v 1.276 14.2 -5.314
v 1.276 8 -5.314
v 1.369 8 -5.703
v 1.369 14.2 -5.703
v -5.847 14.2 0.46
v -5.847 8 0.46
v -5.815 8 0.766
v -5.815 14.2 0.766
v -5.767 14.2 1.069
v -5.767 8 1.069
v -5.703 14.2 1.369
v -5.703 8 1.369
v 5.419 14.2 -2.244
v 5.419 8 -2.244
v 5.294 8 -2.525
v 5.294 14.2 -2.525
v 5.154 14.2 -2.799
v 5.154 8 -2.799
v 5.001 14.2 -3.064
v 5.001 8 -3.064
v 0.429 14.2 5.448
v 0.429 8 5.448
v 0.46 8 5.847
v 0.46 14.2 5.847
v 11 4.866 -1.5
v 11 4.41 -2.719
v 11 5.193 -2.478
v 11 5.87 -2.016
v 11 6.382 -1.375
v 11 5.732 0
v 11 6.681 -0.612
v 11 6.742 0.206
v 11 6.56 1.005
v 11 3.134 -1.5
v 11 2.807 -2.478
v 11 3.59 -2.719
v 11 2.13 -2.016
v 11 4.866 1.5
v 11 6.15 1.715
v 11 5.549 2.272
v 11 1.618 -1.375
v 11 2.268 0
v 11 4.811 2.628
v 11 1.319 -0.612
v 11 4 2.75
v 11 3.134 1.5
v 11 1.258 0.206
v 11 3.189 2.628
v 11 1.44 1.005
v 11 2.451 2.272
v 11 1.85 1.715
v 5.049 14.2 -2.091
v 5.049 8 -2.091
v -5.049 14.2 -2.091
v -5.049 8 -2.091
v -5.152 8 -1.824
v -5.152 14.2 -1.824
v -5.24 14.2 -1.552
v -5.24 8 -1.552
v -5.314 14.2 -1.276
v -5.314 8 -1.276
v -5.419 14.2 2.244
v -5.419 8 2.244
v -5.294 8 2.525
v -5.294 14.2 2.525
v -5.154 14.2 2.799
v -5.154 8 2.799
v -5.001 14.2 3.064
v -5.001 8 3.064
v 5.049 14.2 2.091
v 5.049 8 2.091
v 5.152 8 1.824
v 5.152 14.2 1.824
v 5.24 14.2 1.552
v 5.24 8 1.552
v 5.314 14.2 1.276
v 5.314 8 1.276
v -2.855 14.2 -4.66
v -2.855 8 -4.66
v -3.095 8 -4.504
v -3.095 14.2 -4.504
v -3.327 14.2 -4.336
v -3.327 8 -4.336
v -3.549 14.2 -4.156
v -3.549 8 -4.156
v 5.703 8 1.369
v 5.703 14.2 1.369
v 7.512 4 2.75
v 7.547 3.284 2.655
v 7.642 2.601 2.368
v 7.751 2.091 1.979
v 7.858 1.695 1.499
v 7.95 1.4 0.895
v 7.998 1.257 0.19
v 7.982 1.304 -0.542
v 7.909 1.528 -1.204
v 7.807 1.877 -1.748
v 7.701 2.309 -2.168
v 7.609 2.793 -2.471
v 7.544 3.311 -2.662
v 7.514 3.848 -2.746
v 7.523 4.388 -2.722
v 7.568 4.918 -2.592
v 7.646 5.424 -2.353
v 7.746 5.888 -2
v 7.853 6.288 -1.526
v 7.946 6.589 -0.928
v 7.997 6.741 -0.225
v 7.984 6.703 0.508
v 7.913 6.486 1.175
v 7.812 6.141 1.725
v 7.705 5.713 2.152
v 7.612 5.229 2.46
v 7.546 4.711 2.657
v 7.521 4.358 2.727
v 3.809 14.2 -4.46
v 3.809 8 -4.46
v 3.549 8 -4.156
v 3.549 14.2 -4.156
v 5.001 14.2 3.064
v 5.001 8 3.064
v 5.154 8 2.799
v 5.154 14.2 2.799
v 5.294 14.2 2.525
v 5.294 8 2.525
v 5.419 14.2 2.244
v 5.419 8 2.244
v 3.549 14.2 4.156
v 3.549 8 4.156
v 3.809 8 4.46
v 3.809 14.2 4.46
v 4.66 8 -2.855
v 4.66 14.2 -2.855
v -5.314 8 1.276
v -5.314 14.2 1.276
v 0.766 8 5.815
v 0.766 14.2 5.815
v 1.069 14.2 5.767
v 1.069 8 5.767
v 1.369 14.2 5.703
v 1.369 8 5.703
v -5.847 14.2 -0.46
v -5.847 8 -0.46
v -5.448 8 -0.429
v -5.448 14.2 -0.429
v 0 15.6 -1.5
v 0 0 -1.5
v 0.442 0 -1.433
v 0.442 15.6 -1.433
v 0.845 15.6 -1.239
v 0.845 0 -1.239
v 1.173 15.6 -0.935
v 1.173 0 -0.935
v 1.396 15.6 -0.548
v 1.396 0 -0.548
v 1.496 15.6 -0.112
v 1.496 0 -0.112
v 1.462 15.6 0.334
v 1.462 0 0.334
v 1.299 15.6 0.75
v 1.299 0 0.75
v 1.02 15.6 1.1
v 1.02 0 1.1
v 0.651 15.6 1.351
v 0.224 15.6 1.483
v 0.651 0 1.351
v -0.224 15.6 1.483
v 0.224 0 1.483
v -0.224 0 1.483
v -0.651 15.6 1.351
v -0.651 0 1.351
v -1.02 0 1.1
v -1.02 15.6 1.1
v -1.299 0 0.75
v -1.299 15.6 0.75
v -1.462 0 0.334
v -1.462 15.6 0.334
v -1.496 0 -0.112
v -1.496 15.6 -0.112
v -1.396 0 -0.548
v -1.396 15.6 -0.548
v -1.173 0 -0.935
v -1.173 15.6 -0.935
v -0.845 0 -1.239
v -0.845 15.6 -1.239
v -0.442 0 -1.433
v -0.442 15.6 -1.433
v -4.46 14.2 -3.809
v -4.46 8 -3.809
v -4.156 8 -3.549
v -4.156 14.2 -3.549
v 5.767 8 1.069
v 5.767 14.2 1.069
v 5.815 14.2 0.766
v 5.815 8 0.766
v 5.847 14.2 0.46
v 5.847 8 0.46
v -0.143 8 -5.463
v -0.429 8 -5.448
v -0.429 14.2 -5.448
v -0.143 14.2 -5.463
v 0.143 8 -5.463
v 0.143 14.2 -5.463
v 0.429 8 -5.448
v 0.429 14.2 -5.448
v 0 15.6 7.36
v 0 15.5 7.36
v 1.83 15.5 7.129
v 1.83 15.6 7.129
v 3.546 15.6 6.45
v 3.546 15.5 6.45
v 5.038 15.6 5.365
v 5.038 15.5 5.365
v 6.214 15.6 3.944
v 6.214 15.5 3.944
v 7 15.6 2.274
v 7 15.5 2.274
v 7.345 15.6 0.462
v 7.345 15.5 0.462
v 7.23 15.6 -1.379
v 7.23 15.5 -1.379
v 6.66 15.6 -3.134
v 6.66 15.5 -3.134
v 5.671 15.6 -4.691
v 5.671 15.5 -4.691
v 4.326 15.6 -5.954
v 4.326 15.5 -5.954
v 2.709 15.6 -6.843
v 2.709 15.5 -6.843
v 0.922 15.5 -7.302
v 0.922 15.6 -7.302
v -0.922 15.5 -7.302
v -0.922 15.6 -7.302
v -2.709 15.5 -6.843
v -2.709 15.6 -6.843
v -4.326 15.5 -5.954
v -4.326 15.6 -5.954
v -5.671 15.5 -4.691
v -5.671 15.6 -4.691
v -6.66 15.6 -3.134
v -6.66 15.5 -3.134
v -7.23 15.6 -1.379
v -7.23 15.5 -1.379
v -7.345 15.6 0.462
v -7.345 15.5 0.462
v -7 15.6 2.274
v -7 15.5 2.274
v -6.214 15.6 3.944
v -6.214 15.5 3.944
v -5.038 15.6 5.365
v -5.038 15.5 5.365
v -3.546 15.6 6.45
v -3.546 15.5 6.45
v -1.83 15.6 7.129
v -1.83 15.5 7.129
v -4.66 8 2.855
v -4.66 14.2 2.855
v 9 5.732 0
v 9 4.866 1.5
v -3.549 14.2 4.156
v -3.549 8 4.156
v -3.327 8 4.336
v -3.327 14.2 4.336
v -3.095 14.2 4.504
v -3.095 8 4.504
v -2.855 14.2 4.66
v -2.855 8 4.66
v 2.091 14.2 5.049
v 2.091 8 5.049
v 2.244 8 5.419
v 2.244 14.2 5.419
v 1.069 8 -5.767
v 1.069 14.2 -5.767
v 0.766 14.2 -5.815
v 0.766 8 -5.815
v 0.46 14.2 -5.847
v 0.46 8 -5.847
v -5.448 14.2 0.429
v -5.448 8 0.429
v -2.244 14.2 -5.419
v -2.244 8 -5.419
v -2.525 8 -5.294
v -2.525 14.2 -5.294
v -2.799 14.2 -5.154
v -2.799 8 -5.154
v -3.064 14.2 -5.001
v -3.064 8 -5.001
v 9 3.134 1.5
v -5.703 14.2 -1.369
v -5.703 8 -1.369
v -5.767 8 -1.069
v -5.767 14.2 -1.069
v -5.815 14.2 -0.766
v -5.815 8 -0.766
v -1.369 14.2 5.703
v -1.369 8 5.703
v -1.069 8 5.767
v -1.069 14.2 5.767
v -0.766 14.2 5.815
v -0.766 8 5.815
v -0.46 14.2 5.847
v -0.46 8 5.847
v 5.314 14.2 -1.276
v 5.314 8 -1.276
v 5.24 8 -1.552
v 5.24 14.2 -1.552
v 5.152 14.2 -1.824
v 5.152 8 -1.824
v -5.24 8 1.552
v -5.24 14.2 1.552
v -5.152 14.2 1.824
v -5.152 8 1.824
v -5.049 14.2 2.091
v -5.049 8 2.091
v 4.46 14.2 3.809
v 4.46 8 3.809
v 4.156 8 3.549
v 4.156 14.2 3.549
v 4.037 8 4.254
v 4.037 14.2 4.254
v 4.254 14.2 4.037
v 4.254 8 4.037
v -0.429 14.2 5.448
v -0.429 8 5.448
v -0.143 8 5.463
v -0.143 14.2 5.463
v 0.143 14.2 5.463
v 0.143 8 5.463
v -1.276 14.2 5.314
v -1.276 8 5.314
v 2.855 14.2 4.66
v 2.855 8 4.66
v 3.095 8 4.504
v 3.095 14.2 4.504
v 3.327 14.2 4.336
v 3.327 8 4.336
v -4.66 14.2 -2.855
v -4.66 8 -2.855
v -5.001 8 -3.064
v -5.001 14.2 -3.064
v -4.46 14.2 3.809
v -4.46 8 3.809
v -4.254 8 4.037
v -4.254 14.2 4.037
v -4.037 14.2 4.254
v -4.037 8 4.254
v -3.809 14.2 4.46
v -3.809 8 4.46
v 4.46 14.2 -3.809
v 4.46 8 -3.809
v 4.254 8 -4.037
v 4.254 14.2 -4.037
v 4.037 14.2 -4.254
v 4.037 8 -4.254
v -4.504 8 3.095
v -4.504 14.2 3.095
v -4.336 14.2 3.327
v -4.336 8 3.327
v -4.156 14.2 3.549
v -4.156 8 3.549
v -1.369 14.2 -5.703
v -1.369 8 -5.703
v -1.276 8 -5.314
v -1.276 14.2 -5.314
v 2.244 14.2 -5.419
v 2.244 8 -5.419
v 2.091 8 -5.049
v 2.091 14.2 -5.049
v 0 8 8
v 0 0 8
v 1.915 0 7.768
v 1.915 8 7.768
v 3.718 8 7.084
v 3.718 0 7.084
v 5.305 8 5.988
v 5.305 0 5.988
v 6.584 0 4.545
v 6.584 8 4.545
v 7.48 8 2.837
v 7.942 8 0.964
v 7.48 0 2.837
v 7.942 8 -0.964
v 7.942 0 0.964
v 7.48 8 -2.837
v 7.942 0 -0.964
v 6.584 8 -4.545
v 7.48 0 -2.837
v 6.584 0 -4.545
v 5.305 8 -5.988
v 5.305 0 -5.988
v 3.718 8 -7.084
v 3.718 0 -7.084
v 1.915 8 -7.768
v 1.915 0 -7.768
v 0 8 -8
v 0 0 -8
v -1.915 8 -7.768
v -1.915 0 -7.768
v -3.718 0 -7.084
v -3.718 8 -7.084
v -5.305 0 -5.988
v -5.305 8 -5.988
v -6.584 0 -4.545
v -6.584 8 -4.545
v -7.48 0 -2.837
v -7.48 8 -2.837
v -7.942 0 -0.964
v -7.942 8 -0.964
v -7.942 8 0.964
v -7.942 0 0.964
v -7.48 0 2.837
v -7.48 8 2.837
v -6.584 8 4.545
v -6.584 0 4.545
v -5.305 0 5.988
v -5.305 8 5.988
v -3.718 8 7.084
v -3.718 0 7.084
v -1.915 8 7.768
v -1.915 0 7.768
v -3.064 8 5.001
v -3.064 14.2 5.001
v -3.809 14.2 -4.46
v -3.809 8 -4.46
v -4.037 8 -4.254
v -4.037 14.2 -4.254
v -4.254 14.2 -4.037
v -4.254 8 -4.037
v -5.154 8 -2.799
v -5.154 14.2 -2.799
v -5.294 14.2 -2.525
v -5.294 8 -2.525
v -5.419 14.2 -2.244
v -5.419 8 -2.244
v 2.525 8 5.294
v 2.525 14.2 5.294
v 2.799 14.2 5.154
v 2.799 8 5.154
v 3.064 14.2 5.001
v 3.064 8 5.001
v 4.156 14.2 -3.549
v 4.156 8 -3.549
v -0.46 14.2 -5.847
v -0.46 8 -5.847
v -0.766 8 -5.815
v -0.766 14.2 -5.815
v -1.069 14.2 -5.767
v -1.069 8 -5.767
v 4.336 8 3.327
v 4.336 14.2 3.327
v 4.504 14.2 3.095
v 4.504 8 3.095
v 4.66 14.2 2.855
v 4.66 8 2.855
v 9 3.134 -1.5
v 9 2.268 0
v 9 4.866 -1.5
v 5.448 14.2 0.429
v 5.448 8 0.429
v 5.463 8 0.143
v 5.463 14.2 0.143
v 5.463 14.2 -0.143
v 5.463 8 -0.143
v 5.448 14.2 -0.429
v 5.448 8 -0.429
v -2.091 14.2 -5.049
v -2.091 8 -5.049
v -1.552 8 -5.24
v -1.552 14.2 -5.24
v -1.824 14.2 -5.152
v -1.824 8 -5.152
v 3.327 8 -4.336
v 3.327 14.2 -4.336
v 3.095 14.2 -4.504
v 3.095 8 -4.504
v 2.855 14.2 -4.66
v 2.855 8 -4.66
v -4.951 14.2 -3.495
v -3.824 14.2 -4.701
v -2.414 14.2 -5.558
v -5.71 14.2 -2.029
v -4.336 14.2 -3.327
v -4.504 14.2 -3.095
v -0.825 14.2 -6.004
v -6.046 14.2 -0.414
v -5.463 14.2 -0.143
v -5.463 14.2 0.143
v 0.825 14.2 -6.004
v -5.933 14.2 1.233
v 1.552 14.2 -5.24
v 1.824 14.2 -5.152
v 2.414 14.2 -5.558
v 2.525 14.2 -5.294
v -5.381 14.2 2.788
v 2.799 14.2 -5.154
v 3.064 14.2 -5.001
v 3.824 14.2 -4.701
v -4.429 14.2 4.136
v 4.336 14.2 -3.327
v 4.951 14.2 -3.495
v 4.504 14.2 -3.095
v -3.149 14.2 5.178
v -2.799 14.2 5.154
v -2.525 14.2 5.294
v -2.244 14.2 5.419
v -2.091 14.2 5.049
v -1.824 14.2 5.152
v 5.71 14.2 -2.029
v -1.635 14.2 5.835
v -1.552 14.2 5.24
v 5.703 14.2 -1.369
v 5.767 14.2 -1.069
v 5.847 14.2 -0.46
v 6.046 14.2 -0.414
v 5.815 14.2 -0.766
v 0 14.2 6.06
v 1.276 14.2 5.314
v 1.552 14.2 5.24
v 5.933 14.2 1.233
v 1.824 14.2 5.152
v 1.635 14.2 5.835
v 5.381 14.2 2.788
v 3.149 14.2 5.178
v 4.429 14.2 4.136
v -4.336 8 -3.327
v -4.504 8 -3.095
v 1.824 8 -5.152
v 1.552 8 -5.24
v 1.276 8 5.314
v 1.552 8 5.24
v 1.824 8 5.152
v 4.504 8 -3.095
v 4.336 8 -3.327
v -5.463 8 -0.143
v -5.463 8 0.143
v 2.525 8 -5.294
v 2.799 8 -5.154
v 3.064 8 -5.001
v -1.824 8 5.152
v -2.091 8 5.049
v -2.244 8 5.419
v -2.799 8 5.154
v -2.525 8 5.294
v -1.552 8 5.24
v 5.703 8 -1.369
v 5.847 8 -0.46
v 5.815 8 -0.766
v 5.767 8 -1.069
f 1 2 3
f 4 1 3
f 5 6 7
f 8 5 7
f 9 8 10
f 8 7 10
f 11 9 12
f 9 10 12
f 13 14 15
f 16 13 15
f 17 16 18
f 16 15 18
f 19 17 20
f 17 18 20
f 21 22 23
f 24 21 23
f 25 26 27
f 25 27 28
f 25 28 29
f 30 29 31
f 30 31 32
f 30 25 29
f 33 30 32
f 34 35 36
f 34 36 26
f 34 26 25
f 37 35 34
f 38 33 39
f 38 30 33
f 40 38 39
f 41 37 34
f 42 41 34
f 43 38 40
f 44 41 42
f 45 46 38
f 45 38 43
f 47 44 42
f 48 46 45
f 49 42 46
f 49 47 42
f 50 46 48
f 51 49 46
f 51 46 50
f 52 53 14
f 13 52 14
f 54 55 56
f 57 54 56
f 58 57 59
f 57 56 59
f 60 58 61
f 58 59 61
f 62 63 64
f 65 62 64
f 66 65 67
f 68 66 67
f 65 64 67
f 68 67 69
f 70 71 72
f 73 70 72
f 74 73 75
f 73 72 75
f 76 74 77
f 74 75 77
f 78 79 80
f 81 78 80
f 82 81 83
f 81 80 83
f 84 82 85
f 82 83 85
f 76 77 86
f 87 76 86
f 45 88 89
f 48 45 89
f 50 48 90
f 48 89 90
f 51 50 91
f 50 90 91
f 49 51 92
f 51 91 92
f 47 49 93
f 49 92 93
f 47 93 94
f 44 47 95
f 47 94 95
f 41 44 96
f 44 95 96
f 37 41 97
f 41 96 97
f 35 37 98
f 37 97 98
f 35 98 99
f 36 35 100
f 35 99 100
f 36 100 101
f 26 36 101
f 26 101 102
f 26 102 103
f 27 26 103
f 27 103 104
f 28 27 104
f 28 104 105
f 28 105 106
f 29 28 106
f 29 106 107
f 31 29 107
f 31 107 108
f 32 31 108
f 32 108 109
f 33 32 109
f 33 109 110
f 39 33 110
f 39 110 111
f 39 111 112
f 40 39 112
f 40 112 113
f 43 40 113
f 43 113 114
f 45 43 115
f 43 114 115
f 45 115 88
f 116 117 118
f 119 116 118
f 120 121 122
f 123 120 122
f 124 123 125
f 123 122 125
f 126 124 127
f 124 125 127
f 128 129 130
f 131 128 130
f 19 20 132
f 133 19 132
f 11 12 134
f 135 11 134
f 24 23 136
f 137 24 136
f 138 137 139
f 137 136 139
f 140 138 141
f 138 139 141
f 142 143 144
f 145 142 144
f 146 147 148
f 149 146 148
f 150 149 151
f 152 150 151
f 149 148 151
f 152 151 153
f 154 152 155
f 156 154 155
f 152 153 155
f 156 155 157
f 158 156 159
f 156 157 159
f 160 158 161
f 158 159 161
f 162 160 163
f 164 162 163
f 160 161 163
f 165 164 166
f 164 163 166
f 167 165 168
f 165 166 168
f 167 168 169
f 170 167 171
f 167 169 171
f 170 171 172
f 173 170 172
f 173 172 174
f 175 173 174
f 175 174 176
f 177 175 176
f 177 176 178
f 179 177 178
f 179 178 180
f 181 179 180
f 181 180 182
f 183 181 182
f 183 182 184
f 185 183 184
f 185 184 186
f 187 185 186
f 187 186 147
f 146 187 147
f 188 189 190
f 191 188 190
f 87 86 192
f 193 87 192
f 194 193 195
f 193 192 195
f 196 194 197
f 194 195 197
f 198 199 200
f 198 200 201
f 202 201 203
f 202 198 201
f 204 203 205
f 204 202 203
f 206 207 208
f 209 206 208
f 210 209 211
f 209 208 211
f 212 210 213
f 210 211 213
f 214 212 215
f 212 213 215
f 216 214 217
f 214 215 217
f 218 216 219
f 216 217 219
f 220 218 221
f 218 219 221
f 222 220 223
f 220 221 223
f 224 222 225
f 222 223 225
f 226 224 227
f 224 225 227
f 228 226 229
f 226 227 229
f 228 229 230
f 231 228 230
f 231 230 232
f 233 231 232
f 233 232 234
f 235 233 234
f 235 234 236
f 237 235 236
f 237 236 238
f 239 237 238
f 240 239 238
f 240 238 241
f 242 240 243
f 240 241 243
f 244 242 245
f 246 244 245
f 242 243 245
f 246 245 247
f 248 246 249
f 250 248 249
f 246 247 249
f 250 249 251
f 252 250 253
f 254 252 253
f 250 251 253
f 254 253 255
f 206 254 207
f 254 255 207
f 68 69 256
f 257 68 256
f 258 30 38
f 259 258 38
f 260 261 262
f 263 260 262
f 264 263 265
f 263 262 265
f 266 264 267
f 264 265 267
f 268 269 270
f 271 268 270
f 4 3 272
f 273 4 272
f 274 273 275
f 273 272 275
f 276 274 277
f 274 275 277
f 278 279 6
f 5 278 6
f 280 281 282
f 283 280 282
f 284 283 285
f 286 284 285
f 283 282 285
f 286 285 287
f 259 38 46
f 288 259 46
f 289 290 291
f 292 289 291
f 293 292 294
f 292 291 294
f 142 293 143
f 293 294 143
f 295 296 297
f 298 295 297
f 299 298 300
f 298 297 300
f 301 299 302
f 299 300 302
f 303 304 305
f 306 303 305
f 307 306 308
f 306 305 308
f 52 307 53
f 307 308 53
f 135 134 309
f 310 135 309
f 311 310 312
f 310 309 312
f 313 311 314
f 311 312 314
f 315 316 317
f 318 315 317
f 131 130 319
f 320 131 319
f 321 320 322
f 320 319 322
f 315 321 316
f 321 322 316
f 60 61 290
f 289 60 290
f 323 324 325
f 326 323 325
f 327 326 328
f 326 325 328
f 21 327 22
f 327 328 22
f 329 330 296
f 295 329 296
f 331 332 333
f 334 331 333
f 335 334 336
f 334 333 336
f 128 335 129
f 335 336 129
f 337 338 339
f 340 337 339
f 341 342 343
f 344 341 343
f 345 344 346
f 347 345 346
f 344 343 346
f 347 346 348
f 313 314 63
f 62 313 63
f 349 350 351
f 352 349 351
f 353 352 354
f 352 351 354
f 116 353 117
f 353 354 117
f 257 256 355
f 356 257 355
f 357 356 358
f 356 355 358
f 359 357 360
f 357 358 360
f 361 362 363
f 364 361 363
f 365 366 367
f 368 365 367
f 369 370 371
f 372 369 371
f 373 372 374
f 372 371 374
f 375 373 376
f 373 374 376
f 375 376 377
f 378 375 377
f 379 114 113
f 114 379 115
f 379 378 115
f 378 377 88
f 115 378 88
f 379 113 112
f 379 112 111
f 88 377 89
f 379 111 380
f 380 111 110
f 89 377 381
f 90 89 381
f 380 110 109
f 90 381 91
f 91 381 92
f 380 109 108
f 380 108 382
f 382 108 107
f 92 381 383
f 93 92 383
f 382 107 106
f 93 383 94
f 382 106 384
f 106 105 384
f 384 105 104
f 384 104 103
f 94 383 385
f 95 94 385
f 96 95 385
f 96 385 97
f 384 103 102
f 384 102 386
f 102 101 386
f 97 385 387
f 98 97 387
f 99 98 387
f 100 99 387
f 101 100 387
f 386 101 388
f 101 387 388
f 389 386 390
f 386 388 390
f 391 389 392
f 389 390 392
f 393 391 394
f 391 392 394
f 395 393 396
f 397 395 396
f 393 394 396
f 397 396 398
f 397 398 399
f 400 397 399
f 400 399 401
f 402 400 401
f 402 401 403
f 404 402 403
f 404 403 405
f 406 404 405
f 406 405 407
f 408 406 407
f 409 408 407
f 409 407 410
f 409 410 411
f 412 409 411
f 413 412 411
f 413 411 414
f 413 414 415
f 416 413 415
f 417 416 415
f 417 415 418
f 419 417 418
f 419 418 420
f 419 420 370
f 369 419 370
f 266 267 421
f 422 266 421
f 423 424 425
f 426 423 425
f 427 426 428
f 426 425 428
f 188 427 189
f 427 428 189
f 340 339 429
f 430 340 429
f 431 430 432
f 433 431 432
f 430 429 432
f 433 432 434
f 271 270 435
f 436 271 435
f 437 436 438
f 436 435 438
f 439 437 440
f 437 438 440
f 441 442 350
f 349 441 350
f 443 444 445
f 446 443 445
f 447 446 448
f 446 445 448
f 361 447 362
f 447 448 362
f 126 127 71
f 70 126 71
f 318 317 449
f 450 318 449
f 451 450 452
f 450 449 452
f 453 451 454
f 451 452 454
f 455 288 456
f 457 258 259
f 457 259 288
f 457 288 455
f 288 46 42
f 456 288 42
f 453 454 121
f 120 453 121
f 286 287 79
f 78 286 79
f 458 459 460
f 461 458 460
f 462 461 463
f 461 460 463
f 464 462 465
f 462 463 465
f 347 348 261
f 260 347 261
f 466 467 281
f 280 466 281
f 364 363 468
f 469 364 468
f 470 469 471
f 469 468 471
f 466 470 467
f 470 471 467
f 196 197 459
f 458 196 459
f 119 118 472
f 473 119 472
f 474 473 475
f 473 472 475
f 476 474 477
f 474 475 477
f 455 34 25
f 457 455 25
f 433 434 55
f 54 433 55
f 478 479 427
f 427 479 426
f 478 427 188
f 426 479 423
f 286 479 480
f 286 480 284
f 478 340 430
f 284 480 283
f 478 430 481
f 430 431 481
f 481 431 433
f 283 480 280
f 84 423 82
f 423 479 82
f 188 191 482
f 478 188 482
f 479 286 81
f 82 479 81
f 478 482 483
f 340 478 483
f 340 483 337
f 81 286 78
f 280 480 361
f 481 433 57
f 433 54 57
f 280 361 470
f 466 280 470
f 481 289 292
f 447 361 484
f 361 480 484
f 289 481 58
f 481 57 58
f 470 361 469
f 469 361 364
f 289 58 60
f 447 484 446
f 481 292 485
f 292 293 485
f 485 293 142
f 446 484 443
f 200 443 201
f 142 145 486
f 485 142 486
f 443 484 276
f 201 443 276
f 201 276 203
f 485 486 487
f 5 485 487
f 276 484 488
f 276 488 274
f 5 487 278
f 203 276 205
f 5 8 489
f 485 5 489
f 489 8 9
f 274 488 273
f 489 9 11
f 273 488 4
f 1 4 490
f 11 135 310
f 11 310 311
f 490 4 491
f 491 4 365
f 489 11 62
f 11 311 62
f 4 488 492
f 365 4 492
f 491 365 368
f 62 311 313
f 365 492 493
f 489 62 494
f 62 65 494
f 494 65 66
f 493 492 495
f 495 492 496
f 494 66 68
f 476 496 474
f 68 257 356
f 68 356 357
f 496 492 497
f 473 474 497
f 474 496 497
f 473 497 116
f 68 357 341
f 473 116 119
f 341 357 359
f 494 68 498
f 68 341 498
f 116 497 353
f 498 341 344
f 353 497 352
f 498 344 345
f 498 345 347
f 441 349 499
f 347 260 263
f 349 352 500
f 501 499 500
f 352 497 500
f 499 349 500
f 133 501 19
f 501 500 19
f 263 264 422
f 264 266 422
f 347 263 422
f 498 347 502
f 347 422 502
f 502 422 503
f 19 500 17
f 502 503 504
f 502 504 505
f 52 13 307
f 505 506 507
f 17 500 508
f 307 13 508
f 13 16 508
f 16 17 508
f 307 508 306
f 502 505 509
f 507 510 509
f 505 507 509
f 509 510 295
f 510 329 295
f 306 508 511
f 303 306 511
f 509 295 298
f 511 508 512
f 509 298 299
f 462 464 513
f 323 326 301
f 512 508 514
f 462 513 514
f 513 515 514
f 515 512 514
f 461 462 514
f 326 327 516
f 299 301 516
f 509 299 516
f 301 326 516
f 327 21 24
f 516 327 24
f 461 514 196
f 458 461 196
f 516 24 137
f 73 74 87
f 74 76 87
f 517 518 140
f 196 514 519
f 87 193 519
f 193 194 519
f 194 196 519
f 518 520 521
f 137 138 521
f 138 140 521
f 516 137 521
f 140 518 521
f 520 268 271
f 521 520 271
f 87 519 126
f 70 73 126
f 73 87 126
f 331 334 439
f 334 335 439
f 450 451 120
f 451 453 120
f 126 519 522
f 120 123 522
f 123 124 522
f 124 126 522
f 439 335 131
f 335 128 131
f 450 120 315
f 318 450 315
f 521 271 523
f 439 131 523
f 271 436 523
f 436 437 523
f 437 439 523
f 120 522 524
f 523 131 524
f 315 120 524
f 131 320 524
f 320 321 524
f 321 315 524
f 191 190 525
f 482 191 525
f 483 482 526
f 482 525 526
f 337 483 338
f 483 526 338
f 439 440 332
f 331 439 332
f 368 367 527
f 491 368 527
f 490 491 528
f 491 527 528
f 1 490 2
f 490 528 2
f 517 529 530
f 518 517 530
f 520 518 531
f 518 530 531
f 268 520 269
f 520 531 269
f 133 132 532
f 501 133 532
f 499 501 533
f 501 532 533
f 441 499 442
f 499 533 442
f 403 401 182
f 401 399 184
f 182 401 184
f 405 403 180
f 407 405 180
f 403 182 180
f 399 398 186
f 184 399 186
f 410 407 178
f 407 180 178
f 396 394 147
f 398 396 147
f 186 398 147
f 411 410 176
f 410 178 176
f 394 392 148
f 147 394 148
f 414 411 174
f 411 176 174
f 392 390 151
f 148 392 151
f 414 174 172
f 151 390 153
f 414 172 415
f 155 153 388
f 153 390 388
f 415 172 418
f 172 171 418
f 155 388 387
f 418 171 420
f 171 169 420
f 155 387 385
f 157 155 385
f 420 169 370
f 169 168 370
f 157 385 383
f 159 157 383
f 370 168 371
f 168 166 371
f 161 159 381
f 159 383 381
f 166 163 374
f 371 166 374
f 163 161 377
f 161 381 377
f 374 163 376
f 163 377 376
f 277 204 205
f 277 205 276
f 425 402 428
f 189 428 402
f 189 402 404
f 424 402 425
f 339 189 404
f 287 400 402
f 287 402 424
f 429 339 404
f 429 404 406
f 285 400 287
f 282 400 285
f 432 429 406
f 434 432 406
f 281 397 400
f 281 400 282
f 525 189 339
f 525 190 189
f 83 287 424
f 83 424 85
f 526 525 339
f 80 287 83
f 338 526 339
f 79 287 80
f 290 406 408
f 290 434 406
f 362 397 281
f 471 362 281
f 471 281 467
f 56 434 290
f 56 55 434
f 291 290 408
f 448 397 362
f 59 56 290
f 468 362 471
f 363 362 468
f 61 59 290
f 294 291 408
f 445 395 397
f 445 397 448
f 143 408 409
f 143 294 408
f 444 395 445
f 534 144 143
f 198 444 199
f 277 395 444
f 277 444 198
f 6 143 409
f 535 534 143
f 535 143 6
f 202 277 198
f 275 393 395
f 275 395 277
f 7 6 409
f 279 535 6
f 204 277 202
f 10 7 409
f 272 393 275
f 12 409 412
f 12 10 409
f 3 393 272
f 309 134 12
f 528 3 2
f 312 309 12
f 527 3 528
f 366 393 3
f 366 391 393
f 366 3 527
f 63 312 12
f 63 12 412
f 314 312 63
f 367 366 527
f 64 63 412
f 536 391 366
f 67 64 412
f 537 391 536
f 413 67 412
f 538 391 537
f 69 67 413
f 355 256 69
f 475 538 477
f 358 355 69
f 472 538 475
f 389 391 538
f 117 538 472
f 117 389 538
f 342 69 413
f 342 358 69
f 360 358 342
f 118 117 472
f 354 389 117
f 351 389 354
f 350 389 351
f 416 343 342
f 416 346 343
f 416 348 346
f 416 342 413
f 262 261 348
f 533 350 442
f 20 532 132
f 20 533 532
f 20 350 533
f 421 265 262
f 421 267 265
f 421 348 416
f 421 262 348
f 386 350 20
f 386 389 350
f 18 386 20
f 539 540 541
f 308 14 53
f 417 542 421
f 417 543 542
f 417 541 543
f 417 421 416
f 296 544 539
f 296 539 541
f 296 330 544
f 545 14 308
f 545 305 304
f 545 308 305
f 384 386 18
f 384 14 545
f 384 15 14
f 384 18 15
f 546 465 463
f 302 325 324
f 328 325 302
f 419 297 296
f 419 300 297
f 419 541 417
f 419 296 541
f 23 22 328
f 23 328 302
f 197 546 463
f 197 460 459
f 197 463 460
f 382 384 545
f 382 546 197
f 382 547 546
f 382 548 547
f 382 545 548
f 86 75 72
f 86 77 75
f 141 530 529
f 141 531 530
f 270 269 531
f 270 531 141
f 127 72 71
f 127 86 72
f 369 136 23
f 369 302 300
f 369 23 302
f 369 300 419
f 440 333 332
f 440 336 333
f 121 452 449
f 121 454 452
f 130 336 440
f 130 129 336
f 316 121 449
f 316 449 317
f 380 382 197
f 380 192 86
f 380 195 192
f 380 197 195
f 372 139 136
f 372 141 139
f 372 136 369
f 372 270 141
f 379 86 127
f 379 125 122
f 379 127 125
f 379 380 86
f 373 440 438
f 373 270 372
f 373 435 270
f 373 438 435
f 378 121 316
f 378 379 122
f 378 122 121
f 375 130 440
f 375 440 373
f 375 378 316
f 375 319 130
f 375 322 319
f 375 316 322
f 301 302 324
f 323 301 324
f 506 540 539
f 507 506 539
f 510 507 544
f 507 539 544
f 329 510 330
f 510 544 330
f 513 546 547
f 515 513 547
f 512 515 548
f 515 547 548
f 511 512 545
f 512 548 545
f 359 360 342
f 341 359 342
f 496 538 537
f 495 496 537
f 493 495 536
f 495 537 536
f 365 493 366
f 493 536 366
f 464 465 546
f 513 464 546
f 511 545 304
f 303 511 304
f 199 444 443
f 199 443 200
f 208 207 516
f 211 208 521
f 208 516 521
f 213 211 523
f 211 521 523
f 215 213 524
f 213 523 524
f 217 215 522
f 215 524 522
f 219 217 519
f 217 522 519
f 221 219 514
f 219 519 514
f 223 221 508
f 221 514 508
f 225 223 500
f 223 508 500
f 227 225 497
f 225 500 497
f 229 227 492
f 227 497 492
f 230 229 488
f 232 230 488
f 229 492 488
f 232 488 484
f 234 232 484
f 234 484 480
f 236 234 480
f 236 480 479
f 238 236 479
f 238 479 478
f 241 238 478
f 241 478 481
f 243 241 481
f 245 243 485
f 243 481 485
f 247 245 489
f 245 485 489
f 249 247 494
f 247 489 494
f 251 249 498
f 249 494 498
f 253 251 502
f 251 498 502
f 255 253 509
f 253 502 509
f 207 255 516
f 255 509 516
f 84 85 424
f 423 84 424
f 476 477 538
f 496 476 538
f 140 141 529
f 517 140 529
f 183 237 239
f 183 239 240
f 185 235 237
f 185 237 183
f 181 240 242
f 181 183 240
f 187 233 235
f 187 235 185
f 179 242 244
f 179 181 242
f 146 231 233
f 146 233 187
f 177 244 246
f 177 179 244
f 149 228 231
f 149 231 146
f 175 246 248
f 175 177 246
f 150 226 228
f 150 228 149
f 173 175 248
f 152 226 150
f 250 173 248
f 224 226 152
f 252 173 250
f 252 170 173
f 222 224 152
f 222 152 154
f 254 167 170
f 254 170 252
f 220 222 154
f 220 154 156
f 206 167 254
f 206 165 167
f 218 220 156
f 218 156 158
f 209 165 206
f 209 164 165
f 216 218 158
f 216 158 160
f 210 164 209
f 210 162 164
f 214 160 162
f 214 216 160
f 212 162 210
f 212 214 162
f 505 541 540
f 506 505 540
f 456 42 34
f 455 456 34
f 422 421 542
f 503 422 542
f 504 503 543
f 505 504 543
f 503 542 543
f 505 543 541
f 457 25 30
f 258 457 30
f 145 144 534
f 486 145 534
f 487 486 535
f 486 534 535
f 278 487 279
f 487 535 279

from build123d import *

# Parameters (mm, degrees)
SKETCH1_R           = 8
BOSS_EXTRUDE1_DEPTH = 8
SKETCH2_R           = 5.865
BOSS_EXTRUDE2_DEPTH = 6.2
CUT_EXTRUDE2_START  = -6.2
CUT_EXTRUDE2_DEPTH  = 6.2
SKETCH3_R           = 7.36
BOSS_EXTRUDE3_DEPTH = 1.4
CHAMFER1_SIZE       = 1.3
SKETCH4_R           = 2.75
BOSS_EXTRUDE4_DEPTH = 11
CUT_EXTRUDE1_DEPTH  = 2
SKETCH7_R           = 1.5
CUT_EXTRUDE3_DEPTH  = 21.696859757


with BuildPart() as part:
    # Sketch1 → Boss-Extrude1 (new body)
    with BuildSketch(Plane(origin=(0, 0, 0), x_dir=(1, 0, 0), z_dir=(0, 1, 0))):
        with Locations(Location((0, 0, 0), (0, 0, 270))):
            Circle(SKETCH1_R)
    extrude(amount=BOSS_EXTRUDE1_DEPTH)

    # Sketch2 → Boss-Extrude2 (add)
    with BuildSketch(Plane(origin=(0, 8, 0), x_dir=(1, 0, 0), z_dir=(0, 1, 0))):
        with Locations(Location((0, 0, 0), (0, 0, 90))):
            Circle(SKETCH2_R)
    extrude(amount=BOSS_EXTRUDE2_DEPTH)

    # Sketch6 → Cut-Extrude2 (cut)
    with BuildSketch(Plane(origin=(0, 14.2, 0), x_dir=(1, 0, 0), z_dir=(0, 1, 0)).offset(CUT_EXTRUDE2_START)):
        with BuildLine():
            Line((-0.460162596, 5.846920162), (-0.428778958, 5.448153229))
            ThreePointArc((-0.428778958, 5.448153229), (0, 5.465), (0.428778958, 5.448153229))
            Line((0.428778958, 5.448153229), (0.460162596, 5.846920162))
            ThreePointArc((0.460162596, 5.846920162), (0, 5.865), (-0.460162596, 5.846920162))
        make_face()
        with BuildLine():
            Line((2.244438331, 5.418553458), (2.091364958, 5.049001645))
            ThreePointArc((2.091364958, 5.049001645), (1.688777874, 5.197523862), (1.275778913, 5.314001615))
            Line((1.275778913, 5.314001615), (1.369157059, 5.702949583))
            ThreePointArc((1.369157059, 5.702949583), (1.812384672, 5.577946468), (2.244438331, 5.418553458))
        make_face()
        with BuildLine():
            Line((3.809012803, 4.459780988), (3.549233584, 4.155618602))
            ThreePointArc((3.549233584, 4.155618602), (3.212246404, 4.421277874), (2.855454656, 4.659678498))
            Line((2.855454656, 4.659678498), (3.064454082, 5.000734564))
            ThreePointArc((3.064454082, 5.000734564), (3.447360505, 4.744884672), (3.809012803, 4.459780988))
        make_face()
        with BuildLine():
            Line((5.000734564, 3.064454082), (4.659678498, 2.855454656))
            ThreePointArc((4.659678498, 2.855454656), (4.421277874, 3.212246404), (4.155618602, 3.549233584))
            Line((4.155618602, 3.549233584), (4.459780988, 3.809012803))
            ThreePointArc((4.459780988, 3.809012803), (4.744884672, 3.447360505), (5.000734564, 3.064454082))
        make_face()
        with BuildLine():
            Line((5.702949583, 1.369157059), (5.314001615, 1.275778913))
            ThreePointArc((5.314001615, 1.275778913), (5.197523862, 1.688777874), (5.049001645, 2.091364958))
            Line((5.049001645, 2.091364958), (5.418553458, 2.244438331))
            ThreePointArc((5.418553458, 2.244438331), (5.577946468, 1.812384672), (5.702949583, 1.369157059))
        make_face()
        with BuildLine():
            Line((5.846920162, -0.460162596), (5.448153229, -0.428778958))
            ThreePointArc((5.448153229, -0.428778958), (5.465, 0), (5.448153229, 0.428778958))
            Line((5.448153229, 0.428778958), (5.846920162, 0.460162596))
            ThreePointArc((5.846920162, 0.460162596), (5.865, 0), (5.846920162, -0.460162596))
        make_face()
        with BuildLine():
            Line((5.418553458, -2.244438331), (5.049001645, -2.091364958))
            ThreePointArc((5.049001645, -2.091364958), (5.197523862, -1.688777874), (5.314001615, -1.275778913))
            Line((5.314001615, -1.275778913), (5.702949583, -1.369157059))
            ThreePointArc((5.702949583, -1.369157059), (5.577946468, -1.812384672), (5.418553458, -2.244438331))
        make_face()
        with BuildLine():
            Line((4.459780988, -3.809012803), (4.155618602, -3.549233584))
            ThreePointArc((4.155618602, -3.549233584), (4.421277874, -3.212246404), (4.659678498, -2.855454656))
            Line((4.659678498, -2.855454656), (5.000734564, -3.064454082))
            ThreePointArc((5.000734564, -3.064454082), (4.744884672, -3.447360505), (4.459780988, -3.809012803))
        make_face()
        with BuildLine():
            Line((3.064454082, -5.000734564), (2.855454656, -4.659678498))
            ThreePointArc((2.855454656, -4.659678498), (3.212246404, -4.421277874), (3.549233584, -4.155618602))
            Line((3.549233584, -4.155618602), (3.809012803, -4.459780988))
            ThreePointArc((3.809012803, -4.459780988), (3.447360505, -4.744884672), (3.064454082, -5.000734564))
        make_face()
        with BuildLine():
            Line((1.369157059, -5.702949583), (1.275778913, -5.314001615))
            ThreePointArc((1.275778913, -5.314001615), (1.688777874, -5.197523862), (2.091364958, -5.049001645))
            Line((2.091364958, -5.049001645), (2.244438331, -5.418553458))
            ThreePointArc((2.244438331, -5.418553458), (1.812384672, -5.577946468), (1.369157059, -5.702949583))
        make_face()
        with BuildLine():
            Line((-0.460162596, -5.846920162), (-0.428778958, -5.448153229))
            ThreePointArc((-0.428778958, -5.448153229), (0, -5.465), (0.428778958, -5.448153229))
            Line((0.428778958, -5.448153229), (0.460162596, -5.846920162))
            ThreePointArc((0.460162596, -5.846920162), (0, -5.865), (-0.460162596, -5.846920162))
        make_face()
        with BuildLine():
            Line((-2.244438331, -5.418553458), (-2.091364958, -5.049001645))
            ThreePointArc((-2.091364958, -5.049001645), (-1.688777874, -5.197523862), (-1.275778913, -5.314001615))
            Line((-1.275778913, -5.314001615), (-1.369157059, -5.702949583))
            ThreePointArc((-1.369157059, -5.702949583), (-1.812384672, -5.577946468), (-2.244438331, -5.418553458))
        make_face()
        with BuildLine():
            Line((-3.809012803, -4.459780988), (-3.549233584, -4.155618602))
            ThreePointArc((-3.549233584, -4.155618602), (-3.212246404, -4.421277874), (-2.855454656, -4.659678498))
            Line((-2.855454656, -4.659678498), (-3.064454082, -5.000734564))
            ThreePointArc((-3.064454082, -5.000734564), (-3.447360505, -4.744884672), (-3.809012803, -4.459780988))
        make_face()
        with BuildLine():
            Line((-5.000734564, -3.064454082), (-4.659678498, -2.855454656))
            ThreePointArc((-4.659678498, -2.855454656), (-4.421277874, -3.212246404), (-4.155618602, -3.549233584))
            Line((-4.155618602, -3.549233584), (-4.459780988, -3.809012803))
            ThreePointArc((-4.459780988, -3.809012803), (-4.744884672, -3.447360505), (-5.000734564, -3.064454082))
        make_face()
        with BuildLine():
            Line((-5.702949583, -1.369157059), (-5.314001615, -1.275778913))
            ThreePointArc((-5.314001615, -1.275778913), (-5.197523862, -1.688777874), (-5.049001645, -2.091364958))
            Line((-5.049001645, -2.091364958), (-5.418553458, -2.244438331))
            ThreePointArc((-5.418553458, -2.244438331), (-5.577946468, -1.812384672), (-5.702949583, -1.369157059))
        make_face()
        with BuildLine():
            Line((-5.846920162, 0.460162596), (-5.448153229, 0.428778958))
            ThreePointArc((-5.448153229, 0.428778958), (-5.465, 0), (-5.448153229, -0.428778958))
            Line((-5.448153229, -0.428778958), (-5.846920162, -0.460162596))
            ThreePointArc((-5.846920162, -0.460162596), (-5.865, 0), (-5.846920162, 0.460162596))
        make_face()
        with BuildLine():
            Line((-5.418553458, 2.244438331), (-5.049001645, 2.091364958))
            ThreePointArc((-5.049001645, 2.091364958), (-5.197523862, 1.688777874), (-5.314001615, 1.275778913))
            Line((-5.314001615, 1.275778913), (-5.702949583, 1.369157059))
            ThreePointArc((-5.702949583, 1.369157059), (-5.577946468, 1.812384672), (-5.418553458, 2.244438331))
        make_face()
        with BuildLine():
            Line((-4.459780988, 3.809012803), (-4.155618602, 3.549233584))
            ThreePointArc((-4.155618602, 3.549233584), (-4.421277874, 3.212246404), (-4.659678498, 2.855454656))
            Line((-4.659678498, 2.855454656), (-5.000734564, 3.064454082))
            ThreePointArc((-5.000734564, 3.064454082), (-4.744884672, 3.447360505), (-4.459780988, 3.809012803))
        make_face()
        with BuildLine():
            Line((-3.064454082, 5.000734564), (-2.855454656, 4.659678498))
            ThreePointArc((-2.855454656, 4.659678498), (-3.212246404, 4.421277874), (-3.549233584, 4.155618602))
            Line((-3.549233584, 4.155618602), (-3.809012803, 4.459780988))
            ThreePointArc((-3.809012803, 4.459780988), (-3.447360505, 4.744884672), (-3.064454082, 5.000734564))
        make_face()
        with BuildLine():
            Line((-1.369157059, 5.702949583), (-1.275778913, 5.314001615))
            ThreePointArc((-1.275778913, 5.314001615), (-1.688777874, 5.197523862), (-2.091364958, 5.049001645))
            Line((-2.091364958, 5.049001645), (-2.244438331, 5.418553458))
            ThreePointArc((-2.244438331, 5.418553458), (-1.812384672, 5.577946468), (-1.369157059, 5.702949583))
        make_face()
    extrude(amount=CUT_EXTRUDE2_DEPTH, mode=Mode.SUBTRACT)

    # Sketch3 → Boss-Extrude3 (add)
    with BuildSketch(Plane(origin=(0, 14.2, 0), x_dir=(1, 0, 0), z_dir=(0, 1, 0))):
        with Locations(Location((0, 0, 0), (0, 0, 270))):
            Circle(SKETCH3_R)
    extrude(amount=BOSS_EXTRUDE3_DEPTH)

    # Chamfer1
    chamfer1_edges = [part.edges().sort_by_distance(p)[0] for p in [
        (0, 14.2, -7.36),
    ]]
    chamfer(chamfer1_edges, length=CHAMFER1_SIZE)

    # Sketch4 → Boss-Extrude4 (add)
    with BuildSketch(Plane(origin=(0, 0, 0), x_dir=(0, 0, -1), z_dir=(1, 0, 0))):
        with Locations(Location((0, 4, 0), (0, 0, 180))):
            Circle(SKETCH4_R)
    extrude(amount=BOSS_EXTRUDE4_DEPTH)

    # Sketch5 → Cut-Extrude1 (cut)
    with BuildSketch(Plane(origin=(11, 0, 0), x_dir=(0, 0, -1), z_dir=(1, 0, 0))):
        Polygon((0, 2.267949192), (1.5, 3.133974596), (1.5, 4.866025404), (0, 5.732050808), (-1.5, 4.866025404), (-1.5, 3.133974596), align=None)
    extrude(amount=-CUT_EXTRUDE1_DEPTH, mode=Mode.SUBTRACT)

    # Sketch7 → Cut-Extrude3 (cut, through all)
    with BuildSketch(Plane.XZ):
        with Locations(Location((0, 0, 0), (0, 0, 270))):
            Circle(SKETCH7_R)
    extrude(amount=-CUT_EXTRUDE3_DEPTH, mode=Mode.SUBTRACT)


solid = part.part
